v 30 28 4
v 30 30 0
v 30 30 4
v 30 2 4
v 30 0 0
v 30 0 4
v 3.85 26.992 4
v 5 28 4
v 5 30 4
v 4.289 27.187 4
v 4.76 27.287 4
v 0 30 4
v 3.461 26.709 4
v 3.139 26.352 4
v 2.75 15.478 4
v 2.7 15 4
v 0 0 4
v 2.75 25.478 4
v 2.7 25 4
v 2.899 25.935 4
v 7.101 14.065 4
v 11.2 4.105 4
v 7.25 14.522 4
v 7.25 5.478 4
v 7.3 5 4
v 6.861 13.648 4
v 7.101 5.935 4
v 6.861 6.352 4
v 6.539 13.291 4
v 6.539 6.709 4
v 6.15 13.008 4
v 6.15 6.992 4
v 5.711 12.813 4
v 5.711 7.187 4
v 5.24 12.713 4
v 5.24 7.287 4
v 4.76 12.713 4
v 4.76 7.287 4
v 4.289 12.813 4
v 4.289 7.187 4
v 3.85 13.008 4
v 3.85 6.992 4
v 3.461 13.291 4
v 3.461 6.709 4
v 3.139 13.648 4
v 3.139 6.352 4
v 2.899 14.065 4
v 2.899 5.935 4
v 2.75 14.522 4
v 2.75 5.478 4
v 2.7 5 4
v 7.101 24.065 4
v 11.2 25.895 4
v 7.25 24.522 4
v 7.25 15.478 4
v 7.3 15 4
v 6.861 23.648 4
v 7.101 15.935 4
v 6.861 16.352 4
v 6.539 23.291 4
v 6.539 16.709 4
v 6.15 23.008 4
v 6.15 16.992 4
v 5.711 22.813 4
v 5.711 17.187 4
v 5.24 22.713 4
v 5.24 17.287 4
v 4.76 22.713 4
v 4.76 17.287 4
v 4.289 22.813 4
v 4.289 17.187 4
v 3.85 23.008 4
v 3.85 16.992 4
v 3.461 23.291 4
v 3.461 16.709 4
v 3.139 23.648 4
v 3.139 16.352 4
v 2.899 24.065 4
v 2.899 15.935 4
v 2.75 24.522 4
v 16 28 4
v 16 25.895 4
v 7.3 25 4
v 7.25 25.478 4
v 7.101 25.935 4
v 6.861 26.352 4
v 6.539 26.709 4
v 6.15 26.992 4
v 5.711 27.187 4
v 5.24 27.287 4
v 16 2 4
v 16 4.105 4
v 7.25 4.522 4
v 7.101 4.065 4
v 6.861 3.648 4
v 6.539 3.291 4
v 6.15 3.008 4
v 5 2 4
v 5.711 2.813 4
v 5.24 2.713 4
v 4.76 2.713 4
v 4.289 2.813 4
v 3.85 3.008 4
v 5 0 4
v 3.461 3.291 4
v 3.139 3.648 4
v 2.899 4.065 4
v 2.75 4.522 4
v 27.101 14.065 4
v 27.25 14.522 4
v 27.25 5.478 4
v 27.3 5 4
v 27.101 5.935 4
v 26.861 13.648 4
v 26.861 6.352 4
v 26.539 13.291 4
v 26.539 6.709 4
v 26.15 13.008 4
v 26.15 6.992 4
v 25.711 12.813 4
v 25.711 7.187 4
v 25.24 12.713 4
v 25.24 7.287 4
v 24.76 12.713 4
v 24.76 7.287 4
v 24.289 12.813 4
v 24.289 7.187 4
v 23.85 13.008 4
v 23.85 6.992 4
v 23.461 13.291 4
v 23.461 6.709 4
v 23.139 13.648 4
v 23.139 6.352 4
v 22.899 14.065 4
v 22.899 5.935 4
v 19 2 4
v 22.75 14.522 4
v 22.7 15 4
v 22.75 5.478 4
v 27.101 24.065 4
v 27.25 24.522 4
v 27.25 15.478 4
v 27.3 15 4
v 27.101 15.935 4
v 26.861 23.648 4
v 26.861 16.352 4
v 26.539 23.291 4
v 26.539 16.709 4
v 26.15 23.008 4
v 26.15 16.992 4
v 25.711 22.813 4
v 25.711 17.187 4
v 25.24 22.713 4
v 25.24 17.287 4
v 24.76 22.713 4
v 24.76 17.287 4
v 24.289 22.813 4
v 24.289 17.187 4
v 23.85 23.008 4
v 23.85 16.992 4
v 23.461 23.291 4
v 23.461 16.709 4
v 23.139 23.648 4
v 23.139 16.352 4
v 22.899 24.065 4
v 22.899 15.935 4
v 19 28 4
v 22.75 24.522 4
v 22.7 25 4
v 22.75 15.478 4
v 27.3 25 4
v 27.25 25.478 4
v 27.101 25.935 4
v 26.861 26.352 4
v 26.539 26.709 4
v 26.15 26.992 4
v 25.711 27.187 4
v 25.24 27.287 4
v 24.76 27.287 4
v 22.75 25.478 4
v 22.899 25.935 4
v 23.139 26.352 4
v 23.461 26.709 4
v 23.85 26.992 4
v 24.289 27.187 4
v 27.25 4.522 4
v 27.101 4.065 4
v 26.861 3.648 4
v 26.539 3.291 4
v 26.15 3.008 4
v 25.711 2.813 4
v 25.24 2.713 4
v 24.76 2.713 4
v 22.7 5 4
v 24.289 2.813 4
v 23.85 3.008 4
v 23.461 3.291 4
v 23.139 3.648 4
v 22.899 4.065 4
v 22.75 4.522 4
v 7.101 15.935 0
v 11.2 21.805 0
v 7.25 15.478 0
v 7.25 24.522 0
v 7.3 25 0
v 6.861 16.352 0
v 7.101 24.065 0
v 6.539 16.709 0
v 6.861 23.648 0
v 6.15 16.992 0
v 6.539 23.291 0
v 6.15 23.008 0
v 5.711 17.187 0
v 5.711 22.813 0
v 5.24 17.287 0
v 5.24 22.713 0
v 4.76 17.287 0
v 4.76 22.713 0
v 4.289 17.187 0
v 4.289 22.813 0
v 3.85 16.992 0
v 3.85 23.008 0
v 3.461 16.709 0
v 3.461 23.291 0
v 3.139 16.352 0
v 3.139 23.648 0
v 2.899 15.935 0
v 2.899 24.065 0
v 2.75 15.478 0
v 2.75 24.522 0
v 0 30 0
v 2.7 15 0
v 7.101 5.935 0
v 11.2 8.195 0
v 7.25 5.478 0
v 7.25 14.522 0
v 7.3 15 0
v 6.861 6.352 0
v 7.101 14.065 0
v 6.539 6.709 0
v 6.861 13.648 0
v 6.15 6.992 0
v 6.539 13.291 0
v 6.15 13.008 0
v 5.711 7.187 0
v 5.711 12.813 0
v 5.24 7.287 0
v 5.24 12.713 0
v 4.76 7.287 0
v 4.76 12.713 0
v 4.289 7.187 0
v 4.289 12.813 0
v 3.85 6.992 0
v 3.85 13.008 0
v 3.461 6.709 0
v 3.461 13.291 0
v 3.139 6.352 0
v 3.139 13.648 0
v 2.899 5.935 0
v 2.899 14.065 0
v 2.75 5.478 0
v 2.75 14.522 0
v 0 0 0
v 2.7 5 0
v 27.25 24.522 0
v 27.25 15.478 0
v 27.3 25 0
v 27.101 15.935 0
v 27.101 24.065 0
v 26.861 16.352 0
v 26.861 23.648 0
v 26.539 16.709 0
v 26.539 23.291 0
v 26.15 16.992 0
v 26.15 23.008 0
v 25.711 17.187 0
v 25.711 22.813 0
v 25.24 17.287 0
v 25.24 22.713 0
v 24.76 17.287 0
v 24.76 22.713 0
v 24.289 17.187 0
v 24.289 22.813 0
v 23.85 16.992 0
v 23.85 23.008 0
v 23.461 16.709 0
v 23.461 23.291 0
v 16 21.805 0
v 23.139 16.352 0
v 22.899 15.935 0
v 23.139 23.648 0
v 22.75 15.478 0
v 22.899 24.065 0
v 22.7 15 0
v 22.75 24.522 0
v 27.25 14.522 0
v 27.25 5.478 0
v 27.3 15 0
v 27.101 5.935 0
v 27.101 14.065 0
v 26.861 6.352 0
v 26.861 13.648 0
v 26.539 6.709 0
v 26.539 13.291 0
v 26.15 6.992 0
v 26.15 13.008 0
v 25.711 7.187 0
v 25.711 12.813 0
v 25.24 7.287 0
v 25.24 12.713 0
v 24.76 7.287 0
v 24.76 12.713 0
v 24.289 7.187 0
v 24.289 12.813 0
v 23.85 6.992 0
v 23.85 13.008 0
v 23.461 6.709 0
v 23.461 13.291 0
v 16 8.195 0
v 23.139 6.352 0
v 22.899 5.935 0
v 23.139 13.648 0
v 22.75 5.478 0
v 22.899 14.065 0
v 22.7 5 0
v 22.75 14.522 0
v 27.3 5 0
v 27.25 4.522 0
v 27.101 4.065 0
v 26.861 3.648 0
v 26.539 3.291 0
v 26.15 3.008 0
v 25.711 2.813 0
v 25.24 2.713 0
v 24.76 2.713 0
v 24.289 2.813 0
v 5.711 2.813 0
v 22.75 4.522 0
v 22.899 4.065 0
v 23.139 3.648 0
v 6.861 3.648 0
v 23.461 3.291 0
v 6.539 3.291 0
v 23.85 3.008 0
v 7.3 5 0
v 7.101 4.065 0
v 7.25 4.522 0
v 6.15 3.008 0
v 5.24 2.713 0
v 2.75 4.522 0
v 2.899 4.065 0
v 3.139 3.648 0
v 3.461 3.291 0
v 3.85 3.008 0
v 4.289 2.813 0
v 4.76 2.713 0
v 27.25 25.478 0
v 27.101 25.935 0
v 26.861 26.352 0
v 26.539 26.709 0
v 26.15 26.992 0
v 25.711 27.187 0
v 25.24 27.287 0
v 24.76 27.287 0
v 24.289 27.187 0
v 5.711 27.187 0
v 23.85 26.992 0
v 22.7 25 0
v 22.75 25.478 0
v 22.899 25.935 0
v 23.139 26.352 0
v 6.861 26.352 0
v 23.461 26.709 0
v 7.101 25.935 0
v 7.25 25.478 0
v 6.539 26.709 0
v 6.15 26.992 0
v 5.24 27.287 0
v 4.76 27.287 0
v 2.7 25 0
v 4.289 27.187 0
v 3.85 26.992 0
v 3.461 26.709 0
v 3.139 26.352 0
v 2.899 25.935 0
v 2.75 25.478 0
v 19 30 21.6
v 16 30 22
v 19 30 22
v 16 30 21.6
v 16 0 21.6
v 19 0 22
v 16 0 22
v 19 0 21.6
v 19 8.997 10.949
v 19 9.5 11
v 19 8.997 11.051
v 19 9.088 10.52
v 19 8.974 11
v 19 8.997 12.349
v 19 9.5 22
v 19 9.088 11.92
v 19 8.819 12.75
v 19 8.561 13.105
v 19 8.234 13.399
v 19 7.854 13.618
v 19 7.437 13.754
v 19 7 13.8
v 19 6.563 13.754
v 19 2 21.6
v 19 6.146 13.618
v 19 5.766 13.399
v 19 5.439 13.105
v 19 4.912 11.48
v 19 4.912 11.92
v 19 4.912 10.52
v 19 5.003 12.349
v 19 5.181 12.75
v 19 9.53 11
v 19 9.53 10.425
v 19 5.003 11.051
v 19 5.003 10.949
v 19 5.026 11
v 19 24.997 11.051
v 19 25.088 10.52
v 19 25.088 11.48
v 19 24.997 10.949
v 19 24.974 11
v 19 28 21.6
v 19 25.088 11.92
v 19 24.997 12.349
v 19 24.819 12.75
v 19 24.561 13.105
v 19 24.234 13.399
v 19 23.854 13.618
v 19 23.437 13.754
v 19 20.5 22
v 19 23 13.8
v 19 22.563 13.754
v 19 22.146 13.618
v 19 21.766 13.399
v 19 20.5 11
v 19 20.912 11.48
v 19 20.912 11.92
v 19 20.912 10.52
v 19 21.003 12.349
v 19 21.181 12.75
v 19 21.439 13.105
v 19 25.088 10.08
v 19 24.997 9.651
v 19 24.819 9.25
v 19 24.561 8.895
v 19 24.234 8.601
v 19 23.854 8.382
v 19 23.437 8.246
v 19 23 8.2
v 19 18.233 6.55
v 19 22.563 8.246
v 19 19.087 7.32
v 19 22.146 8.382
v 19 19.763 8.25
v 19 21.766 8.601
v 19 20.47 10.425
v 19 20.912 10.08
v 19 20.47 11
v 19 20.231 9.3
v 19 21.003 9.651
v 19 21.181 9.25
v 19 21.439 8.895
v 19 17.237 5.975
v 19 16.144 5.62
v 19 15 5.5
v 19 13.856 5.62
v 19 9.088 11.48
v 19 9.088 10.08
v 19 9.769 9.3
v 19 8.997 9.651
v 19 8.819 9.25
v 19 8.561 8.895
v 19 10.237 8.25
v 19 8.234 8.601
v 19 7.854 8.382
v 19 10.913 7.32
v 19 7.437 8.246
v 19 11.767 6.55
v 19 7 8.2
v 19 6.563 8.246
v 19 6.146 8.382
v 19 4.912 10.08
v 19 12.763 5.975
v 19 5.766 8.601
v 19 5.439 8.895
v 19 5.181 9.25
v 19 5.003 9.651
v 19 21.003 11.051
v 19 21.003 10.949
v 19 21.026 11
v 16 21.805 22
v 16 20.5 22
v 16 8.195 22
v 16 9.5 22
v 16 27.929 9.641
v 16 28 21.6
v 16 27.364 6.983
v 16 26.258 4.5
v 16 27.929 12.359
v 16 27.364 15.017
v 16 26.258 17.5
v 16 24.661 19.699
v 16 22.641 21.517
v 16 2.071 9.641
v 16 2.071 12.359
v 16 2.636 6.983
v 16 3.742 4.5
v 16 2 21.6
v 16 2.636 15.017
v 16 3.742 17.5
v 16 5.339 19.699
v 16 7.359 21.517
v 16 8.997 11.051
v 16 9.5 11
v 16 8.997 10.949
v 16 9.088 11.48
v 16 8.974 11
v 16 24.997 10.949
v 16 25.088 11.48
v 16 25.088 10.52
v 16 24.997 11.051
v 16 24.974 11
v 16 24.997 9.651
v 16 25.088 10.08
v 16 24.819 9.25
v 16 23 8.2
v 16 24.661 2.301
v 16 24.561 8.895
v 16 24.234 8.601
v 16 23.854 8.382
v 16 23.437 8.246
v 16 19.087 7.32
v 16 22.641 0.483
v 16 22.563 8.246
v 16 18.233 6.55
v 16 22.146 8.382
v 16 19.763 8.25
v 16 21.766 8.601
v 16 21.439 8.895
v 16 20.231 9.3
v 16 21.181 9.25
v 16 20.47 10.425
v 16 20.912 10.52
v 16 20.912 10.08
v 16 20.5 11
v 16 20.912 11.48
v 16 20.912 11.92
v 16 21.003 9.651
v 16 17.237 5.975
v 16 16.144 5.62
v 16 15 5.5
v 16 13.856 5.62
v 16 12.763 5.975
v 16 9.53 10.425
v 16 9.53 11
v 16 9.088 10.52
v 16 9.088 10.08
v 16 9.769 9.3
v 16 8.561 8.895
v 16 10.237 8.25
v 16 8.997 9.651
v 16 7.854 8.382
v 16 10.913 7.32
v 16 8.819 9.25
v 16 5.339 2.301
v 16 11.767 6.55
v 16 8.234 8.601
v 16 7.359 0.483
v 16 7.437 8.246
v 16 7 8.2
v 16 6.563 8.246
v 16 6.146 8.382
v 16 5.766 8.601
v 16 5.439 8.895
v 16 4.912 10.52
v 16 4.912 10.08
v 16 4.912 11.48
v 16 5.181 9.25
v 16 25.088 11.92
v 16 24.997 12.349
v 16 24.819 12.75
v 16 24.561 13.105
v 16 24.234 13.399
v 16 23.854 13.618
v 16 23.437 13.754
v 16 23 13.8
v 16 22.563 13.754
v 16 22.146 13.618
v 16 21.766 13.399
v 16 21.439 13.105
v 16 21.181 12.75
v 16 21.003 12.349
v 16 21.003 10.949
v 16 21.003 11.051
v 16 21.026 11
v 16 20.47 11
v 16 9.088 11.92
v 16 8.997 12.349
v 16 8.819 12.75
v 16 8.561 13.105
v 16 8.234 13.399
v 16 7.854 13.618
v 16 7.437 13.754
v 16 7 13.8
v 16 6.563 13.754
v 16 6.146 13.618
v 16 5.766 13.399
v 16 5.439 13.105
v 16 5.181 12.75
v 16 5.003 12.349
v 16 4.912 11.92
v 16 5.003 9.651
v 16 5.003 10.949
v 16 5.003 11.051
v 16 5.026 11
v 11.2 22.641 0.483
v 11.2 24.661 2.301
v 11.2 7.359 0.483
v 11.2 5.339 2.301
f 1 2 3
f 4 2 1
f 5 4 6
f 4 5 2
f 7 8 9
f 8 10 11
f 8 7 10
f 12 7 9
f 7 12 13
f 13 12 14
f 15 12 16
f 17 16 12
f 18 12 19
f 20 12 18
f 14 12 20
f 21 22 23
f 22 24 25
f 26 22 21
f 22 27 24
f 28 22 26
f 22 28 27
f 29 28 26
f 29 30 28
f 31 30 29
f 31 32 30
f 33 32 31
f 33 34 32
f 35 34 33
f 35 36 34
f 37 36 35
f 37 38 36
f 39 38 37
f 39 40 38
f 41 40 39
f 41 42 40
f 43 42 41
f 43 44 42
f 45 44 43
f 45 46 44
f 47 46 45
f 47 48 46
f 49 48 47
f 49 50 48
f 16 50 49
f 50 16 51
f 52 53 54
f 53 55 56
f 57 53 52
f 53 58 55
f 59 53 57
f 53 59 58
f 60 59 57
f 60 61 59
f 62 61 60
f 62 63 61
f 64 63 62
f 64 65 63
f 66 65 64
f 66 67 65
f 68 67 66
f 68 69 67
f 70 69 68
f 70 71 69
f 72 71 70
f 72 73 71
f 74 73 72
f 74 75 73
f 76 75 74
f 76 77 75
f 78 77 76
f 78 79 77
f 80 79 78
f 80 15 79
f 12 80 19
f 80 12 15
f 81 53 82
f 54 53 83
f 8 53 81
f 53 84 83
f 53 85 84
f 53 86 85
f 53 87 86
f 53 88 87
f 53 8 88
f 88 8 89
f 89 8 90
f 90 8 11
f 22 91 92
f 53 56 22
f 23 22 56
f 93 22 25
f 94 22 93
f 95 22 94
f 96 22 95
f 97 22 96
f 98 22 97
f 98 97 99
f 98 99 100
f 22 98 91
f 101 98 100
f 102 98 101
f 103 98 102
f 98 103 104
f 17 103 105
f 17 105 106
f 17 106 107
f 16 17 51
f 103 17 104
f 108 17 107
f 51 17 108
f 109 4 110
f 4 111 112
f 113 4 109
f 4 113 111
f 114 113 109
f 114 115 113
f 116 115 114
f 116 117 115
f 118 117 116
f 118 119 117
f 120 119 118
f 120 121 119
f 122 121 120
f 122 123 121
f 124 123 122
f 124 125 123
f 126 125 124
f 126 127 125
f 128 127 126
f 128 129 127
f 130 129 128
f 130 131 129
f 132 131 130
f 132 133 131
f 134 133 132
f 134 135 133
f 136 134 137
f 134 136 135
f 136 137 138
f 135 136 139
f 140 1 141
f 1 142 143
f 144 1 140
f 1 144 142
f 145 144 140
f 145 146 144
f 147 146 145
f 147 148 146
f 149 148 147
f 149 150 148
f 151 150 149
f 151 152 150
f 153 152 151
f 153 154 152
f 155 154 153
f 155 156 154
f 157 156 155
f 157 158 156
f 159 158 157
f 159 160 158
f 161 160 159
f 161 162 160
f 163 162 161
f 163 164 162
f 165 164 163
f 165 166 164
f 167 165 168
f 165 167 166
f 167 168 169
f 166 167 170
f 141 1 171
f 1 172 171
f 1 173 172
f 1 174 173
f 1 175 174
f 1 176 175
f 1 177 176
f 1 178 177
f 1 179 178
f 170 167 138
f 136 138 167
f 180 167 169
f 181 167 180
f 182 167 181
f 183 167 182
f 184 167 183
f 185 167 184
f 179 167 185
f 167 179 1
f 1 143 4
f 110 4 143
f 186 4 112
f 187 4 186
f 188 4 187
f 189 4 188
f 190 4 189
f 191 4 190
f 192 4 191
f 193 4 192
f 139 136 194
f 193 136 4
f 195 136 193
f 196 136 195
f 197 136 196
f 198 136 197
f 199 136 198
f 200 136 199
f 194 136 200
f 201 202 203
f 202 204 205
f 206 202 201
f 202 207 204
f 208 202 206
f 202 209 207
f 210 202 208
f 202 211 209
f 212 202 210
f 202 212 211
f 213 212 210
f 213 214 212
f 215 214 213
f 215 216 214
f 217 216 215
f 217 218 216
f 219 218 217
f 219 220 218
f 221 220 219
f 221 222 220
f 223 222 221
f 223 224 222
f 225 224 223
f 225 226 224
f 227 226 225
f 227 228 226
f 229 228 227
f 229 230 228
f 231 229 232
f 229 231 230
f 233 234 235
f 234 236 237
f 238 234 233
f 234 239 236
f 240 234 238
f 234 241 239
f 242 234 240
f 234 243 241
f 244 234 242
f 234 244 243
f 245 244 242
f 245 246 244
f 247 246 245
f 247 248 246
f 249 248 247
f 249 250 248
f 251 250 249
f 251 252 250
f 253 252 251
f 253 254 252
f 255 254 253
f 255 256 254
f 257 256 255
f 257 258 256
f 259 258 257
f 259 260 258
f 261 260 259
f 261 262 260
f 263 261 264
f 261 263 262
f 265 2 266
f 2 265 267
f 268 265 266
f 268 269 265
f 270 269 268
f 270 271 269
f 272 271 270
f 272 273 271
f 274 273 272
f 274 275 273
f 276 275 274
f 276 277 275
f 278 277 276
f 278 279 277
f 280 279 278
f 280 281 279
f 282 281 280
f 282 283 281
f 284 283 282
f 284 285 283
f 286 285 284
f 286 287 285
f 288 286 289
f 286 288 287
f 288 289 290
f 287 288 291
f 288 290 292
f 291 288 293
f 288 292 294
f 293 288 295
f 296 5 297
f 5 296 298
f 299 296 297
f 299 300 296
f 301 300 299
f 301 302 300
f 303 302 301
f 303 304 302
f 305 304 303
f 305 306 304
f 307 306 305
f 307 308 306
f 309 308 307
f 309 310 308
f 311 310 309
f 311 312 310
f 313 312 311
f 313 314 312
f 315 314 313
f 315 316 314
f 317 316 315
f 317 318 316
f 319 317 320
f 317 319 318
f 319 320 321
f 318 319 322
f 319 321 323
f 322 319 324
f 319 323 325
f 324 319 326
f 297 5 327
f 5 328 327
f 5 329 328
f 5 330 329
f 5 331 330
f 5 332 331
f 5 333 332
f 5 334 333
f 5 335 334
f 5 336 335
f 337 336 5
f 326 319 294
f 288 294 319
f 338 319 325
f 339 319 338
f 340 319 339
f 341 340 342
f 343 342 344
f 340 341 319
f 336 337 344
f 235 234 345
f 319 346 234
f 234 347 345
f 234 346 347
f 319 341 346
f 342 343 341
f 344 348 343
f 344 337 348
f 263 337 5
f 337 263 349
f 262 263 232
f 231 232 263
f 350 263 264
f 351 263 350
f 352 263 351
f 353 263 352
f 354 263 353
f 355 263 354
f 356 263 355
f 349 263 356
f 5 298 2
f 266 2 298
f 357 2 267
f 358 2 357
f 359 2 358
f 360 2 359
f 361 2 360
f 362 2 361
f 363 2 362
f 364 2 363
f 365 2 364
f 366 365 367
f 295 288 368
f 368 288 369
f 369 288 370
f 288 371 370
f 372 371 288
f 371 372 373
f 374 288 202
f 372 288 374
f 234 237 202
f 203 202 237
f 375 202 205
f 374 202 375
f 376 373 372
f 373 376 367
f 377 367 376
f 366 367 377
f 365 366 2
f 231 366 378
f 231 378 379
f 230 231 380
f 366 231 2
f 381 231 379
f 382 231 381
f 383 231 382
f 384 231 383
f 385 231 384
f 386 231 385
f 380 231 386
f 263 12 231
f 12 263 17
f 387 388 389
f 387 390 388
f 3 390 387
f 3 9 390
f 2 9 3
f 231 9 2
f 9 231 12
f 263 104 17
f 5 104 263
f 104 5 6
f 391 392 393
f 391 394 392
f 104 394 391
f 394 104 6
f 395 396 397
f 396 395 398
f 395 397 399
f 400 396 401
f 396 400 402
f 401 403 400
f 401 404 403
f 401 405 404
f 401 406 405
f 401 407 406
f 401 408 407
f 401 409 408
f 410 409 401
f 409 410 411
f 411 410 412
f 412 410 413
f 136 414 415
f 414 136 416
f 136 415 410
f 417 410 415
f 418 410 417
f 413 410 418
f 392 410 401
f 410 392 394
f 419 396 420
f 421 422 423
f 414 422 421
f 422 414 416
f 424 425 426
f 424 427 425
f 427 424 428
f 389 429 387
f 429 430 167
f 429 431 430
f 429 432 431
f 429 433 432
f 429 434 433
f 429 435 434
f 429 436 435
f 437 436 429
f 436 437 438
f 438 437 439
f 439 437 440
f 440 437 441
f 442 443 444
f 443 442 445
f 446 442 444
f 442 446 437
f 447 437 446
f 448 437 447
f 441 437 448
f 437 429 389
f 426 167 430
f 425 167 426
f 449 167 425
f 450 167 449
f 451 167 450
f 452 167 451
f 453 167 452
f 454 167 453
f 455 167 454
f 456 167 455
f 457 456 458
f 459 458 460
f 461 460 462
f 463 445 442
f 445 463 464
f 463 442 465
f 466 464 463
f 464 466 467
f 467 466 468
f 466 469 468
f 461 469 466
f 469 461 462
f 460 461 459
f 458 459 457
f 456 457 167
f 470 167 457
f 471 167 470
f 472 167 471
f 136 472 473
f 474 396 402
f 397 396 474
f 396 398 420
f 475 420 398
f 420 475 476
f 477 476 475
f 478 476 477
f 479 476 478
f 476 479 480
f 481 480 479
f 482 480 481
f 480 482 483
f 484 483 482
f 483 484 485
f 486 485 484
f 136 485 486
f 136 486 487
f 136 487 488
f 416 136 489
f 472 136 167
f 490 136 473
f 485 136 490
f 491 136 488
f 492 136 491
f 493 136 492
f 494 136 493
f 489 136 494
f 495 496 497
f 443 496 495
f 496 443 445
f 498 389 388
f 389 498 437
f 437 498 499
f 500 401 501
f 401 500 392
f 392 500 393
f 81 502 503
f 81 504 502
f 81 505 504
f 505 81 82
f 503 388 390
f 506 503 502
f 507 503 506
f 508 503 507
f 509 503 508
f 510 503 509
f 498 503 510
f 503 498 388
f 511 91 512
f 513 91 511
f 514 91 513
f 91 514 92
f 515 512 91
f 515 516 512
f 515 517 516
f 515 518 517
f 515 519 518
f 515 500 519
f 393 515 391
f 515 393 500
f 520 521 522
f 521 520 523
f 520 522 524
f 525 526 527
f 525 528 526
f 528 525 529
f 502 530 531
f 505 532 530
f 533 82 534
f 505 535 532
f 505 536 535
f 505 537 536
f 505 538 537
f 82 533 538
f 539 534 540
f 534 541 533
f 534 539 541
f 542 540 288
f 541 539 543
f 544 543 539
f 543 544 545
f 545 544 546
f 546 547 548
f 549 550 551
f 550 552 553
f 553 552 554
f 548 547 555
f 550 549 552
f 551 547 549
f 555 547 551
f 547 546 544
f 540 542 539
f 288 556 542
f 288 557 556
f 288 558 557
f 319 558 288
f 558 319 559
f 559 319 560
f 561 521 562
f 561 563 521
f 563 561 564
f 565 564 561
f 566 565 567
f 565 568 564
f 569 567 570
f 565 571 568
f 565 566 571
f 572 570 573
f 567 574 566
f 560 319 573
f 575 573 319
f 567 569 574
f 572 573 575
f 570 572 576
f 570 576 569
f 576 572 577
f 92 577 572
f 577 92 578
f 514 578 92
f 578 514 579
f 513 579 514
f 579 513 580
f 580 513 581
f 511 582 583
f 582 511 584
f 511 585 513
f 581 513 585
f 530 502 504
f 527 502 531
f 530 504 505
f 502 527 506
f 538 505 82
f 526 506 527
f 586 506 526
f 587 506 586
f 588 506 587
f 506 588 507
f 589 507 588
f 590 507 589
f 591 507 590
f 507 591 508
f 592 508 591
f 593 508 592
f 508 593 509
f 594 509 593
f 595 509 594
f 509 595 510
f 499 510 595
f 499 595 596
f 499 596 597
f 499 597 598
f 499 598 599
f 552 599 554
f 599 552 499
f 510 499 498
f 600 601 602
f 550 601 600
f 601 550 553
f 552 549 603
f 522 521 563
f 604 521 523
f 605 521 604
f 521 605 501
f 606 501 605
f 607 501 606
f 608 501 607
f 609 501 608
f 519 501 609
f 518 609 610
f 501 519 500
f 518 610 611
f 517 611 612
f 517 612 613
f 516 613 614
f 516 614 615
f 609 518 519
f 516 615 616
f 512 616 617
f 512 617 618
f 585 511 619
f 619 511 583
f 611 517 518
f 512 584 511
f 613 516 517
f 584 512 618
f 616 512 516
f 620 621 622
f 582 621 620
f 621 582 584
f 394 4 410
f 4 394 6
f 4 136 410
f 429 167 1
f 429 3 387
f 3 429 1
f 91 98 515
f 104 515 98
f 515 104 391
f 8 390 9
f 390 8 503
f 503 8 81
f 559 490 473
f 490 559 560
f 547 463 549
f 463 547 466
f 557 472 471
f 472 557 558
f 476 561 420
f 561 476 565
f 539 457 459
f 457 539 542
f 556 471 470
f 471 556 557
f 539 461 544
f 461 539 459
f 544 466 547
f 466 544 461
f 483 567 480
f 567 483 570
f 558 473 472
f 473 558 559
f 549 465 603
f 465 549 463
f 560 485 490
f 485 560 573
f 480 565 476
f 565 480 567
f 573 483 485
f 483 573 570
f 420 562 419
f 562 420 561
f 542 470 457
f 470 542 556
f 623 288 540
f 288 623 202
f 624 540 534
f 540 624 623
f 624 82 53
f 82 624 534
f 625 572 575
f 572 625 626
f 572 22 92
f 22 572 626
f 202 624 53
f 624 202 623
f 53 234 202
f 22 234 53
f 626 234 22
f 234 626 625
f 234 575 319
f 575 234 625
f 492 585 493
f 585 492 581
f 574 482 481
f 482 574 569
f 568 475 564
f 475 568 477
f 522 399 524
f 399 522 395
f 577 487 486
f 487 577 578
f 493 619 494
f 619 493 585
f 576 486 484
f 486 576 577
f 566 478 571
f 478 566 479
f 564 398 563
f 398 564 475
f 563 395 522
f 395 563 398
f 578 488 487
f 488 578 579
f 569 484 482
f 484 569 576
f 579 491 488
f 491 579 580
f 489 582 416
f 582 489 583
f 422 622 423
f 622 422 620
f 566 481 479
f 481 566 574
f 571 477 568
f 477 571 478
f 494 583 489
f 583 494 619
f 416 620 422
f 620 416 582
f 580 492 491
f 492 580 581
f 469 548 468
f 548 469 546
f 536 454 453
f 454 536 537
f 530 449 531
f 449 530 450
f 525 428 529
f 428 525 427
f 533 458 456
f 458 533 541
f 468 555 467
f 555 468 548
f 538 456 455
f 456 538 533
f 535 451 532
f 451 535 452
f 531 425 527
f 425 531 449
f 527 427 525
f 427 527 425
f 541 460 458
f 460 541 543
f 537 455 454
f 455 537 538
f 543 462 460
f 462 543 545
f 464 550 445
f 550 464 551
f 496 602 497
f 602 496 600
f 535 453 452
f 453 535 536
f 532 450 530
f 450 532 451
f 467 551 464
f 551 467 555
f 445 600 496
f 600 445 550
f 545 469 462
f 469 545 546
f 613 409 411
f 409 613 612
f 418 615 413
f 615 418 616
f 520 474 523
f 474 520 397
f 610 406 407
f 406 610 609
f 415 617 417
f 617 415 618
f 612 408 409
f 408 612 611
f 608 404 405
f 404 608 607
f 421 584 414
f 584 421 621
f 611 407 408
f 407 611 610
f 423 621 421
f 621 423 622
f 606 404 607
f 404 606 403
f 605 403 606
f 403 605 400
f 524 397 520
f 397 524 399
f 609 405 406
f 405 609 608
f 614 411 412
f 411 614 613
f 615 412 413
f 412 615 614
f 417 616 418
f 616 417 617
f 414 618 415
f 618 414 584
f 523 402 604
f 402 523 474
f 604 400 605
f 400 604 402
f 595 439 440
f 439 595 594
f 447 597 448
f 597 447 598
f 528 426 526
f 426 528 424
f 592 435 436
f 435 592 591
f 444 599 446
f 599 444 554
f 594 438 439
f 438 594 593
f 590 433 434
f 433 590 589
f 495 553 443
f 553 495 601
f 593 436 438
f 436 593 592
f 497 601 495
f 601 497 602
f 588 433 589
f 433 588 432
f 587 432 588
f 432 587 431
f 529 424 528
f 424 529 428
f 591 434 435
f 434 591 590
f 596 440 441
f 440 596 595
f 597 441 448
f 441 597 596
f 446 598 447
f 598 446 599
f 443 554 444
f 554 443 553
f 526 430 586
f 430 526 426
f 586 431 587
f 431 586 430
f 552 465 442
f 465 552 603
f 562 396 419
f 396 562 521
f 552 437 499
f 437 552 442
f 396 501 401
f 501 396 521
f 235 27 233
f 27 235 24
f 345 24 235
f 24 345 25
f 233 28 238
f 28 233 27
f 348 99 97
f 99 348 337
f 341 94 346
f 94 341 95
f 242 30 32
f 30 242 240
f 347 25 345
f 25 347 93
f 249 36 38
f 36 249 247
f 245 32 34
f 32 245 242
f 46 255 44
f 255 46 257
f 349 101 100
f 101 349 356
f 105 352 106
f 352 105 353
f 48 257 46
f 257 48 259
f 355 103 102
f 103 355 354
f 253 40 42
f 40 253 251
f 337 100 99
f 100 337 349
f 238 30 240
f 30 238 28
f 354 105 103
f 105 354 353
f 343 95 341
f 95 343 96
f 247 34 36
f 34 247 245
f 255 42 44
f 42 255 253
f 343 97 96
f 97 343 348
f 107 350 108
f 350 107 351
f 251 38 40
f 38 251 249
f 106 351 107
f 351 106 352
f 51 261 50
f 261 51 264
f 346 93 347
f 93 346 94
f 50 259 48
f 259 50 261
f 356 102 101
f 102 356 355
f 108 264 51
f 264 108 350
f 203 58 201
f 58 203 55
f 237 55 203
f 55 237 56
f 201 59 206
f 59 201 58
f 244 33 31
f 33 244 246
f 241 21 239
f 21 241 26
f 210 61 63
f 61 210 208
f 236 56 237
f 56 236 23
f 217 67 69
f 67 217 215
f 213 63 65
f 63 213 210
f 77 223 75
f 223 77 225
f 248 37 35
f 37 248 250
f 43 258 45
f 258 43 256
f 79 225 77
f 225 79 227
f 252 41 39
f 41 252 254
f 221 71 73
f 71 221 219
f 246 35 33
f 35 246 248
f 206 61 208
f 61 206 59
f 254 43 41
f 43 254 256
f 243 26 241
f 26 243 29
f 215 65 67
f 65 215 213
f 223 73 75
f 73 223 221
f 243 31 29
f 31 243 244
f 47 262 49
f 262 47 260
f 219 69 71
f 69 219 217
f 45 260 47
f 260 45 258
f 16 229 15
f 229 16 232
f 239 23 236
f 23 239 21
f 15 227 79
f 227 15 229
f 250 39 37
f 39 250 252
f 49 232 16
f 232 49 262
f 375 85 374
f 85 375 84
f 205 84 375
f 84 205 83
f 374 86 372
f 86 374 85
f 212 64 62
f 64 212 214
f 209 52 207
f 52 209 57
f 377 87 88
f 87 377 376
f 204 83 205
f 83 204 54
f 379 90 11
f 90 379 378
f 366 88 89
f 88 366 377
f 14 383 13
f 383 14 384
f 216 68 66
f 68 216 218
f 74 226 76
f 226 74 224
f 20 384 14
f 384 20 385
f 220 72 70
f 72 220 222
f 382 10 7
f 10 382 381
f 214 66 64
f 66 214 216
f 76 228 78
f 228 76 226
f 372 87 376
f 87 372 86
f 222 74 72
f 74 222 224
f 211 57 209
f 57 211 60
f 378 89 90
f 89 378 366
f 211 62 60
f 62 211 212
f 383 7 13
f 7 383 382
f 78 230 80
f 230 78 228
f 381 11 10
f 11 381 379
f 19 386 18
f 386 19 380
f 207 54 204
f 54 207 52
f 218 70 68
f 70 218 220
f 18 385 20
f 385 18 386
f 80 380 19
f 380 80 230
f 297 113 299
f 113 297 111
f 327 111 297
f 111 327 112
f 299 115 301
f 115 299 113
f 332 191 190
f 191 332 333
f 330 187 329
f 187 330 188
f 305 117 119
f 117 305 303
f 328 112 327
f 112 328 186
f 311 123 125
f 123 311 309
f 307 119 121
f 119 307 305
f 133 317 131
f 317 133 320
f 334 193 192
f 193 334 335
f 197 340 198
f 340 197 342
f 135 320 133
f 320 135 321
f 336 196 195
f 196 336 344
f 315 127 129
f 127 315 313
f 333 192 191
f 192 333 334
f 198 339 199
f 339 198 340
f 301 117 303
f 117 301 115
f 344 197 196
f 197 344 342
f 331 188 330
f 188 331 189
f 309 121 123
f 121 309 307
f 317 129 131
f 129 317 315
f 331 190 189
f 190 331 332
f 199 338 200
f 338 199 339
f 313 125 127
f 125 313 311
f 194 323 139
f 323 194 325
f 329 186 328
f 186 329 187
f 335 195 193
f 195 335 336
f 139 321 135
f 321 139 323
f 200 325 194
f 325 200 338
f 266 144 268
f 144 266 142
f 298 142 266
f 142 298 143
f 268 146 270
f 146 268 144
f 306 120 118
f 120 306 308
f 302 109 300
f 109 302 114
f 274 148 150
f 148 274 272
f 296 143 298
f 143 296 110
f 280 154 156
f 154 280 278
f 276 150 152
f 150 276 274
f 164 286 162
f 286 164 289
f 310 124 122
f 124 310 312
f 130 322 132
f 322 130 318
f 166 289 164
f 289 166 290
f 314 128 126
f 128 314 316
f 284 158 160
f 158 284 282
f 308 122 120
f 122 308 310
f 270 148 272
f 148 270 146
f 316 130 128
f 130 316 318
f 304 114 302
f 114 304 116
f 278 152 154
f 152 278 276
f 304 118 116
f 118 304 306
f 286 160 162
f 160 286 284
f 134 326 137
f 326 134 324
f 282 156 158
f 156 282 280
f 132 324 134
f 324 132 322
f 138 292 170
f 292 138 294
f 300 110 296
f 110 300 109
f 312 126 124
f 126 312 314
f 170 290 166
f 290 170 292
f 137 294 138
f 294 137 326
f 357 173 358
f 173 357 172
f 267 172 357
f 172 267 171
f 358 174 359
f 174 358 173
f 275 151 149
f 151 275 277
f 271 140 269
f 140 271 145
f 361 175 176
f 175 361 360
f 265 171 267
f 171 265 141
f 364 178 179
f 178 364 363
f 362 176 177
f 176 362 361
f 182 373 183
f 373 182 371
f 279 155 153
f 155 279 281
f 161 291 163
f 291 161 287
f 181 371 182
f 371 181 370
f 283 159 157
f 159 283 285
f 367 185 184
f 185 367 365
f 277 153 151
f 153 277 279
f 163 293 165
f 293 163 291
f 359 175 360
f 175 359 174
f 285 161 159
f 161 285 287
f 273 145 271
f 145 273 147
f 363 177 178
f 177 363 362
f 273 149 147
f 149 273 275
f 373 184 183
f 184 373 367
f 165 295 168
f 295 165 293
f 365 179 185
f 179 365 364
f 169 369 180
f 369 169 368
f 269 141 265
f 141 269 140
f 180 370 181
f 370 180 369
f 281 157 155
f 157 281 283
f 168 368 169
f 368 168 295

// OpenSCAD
$fn = 30;

x_a = 30;
y_a = 30;
z_1 = 4.0;

d_1 = 11.0;  r_1 = d_1 / 2;
d_2 = 22.0;  r_2 = d_2 / 2;
r_mh = 2.1; l_mh = 8.0;
r_mh2 = 2.3;
z_a = d_2;
z_2 = z_a - z_1;
x_v = 16;
x_w = 3.0;

x_c = x_a / 2;
y_c = y_a / 2;

cf_w = 2.0; cf_h = 11;

rot_y = [0,90,0];

// TODO: to lib
module conterforce( w, h=1.0 )
{
polyhedron( 
  points=[
    [0,-h,0],[0,0,0],[0,0,h],
    [w,-h,0],[w,0,0],[w,0,h]],
  faces=[
    [0,1,2],[0,2,5,3],[3,5,4],
    [0,3,4,1],[1,4,5,2]
  ]);
}

module coord_x_nut_holder() {
  difference() {
    union() {
      cube( [x_a, y_a, z_1] );
      translate( [x_v,0,z_1] ) cube ([x_w,y_a,z_2]);
      translate( [x_v+x_w,0,z_1] ) rotate([0,0,90]) scale([1,1,1.6]) conterforce( cf_w, cf_h );
      translate( [x_v+x_w,y_a-cf_w,z_1] ) rotate([0,0,90]) scale([1,1,1.6]) conterforce( cf_w, cf_h );
      translate( [x_v,cf_w,z_1] ) rotate([0,0,-90]) scale([1,1,1.6]) conterforce( cf_w, cf_h );
      translate( [x_v,y_a,z_1] ) rotate([0,0,-90]) scale([1,1,1.6]) conterforce( cf_w, cf_h );
    }

    // axis
    translate([x_v,y_c,r_2]) rotate(rot_y) cylinder( r=r_1, h=x_w );
    translate([x_v-x_w*1.6,y_c,r_2]) rotate(rot_y) cylinder( r=r_2+2.0, h=x_w*1.6 );
    translate([x_v,y_c-l_mh,r_2-r_mh/3]) rotate(rot_y) cylinder( r=r_mh, h=x_w );
    translate([x_v,y_c+l_mh,r_2-r_mh/3]) rotate(rot_y) cylinder( r=r_mh, h=x_w );
    translate([x_v,y_c-l_mh,r_2+r_mh/3]) rotate(rot_y) cylinder( r=r_mh, h=x_w );
    translate([x_v,y_c+l_mh,r_2+r_mh/3]) rotate(rot_y) cylinder( r=r_mh, h=x_w );
    translate( [x_v,y_c-r_1,r_2] ) cube ([x_w,2*r_1,z_2-z_1]);
    
    
    // mount
    translate([ 5, 5,0]) cylinder( r=r_mh2, h=z_1 );
    translate([ 5,15,0]) cylinder( r=r_mh2, h=z_1 );
    translate([ 5,25,0]) cylinder( r=r_mh2, h=z_1 );
    translate([25, 5,0]) cylinder( r=r_mh2, h=z_1 );
    translate([25,15,0]) cylinder( r=r_mh2, h=z_1 );
    translate([25,25,0]) cylinder( r=r_mh2, h=z_1 );
    
  }

}

coord_x_nut_holder();

echo( );
